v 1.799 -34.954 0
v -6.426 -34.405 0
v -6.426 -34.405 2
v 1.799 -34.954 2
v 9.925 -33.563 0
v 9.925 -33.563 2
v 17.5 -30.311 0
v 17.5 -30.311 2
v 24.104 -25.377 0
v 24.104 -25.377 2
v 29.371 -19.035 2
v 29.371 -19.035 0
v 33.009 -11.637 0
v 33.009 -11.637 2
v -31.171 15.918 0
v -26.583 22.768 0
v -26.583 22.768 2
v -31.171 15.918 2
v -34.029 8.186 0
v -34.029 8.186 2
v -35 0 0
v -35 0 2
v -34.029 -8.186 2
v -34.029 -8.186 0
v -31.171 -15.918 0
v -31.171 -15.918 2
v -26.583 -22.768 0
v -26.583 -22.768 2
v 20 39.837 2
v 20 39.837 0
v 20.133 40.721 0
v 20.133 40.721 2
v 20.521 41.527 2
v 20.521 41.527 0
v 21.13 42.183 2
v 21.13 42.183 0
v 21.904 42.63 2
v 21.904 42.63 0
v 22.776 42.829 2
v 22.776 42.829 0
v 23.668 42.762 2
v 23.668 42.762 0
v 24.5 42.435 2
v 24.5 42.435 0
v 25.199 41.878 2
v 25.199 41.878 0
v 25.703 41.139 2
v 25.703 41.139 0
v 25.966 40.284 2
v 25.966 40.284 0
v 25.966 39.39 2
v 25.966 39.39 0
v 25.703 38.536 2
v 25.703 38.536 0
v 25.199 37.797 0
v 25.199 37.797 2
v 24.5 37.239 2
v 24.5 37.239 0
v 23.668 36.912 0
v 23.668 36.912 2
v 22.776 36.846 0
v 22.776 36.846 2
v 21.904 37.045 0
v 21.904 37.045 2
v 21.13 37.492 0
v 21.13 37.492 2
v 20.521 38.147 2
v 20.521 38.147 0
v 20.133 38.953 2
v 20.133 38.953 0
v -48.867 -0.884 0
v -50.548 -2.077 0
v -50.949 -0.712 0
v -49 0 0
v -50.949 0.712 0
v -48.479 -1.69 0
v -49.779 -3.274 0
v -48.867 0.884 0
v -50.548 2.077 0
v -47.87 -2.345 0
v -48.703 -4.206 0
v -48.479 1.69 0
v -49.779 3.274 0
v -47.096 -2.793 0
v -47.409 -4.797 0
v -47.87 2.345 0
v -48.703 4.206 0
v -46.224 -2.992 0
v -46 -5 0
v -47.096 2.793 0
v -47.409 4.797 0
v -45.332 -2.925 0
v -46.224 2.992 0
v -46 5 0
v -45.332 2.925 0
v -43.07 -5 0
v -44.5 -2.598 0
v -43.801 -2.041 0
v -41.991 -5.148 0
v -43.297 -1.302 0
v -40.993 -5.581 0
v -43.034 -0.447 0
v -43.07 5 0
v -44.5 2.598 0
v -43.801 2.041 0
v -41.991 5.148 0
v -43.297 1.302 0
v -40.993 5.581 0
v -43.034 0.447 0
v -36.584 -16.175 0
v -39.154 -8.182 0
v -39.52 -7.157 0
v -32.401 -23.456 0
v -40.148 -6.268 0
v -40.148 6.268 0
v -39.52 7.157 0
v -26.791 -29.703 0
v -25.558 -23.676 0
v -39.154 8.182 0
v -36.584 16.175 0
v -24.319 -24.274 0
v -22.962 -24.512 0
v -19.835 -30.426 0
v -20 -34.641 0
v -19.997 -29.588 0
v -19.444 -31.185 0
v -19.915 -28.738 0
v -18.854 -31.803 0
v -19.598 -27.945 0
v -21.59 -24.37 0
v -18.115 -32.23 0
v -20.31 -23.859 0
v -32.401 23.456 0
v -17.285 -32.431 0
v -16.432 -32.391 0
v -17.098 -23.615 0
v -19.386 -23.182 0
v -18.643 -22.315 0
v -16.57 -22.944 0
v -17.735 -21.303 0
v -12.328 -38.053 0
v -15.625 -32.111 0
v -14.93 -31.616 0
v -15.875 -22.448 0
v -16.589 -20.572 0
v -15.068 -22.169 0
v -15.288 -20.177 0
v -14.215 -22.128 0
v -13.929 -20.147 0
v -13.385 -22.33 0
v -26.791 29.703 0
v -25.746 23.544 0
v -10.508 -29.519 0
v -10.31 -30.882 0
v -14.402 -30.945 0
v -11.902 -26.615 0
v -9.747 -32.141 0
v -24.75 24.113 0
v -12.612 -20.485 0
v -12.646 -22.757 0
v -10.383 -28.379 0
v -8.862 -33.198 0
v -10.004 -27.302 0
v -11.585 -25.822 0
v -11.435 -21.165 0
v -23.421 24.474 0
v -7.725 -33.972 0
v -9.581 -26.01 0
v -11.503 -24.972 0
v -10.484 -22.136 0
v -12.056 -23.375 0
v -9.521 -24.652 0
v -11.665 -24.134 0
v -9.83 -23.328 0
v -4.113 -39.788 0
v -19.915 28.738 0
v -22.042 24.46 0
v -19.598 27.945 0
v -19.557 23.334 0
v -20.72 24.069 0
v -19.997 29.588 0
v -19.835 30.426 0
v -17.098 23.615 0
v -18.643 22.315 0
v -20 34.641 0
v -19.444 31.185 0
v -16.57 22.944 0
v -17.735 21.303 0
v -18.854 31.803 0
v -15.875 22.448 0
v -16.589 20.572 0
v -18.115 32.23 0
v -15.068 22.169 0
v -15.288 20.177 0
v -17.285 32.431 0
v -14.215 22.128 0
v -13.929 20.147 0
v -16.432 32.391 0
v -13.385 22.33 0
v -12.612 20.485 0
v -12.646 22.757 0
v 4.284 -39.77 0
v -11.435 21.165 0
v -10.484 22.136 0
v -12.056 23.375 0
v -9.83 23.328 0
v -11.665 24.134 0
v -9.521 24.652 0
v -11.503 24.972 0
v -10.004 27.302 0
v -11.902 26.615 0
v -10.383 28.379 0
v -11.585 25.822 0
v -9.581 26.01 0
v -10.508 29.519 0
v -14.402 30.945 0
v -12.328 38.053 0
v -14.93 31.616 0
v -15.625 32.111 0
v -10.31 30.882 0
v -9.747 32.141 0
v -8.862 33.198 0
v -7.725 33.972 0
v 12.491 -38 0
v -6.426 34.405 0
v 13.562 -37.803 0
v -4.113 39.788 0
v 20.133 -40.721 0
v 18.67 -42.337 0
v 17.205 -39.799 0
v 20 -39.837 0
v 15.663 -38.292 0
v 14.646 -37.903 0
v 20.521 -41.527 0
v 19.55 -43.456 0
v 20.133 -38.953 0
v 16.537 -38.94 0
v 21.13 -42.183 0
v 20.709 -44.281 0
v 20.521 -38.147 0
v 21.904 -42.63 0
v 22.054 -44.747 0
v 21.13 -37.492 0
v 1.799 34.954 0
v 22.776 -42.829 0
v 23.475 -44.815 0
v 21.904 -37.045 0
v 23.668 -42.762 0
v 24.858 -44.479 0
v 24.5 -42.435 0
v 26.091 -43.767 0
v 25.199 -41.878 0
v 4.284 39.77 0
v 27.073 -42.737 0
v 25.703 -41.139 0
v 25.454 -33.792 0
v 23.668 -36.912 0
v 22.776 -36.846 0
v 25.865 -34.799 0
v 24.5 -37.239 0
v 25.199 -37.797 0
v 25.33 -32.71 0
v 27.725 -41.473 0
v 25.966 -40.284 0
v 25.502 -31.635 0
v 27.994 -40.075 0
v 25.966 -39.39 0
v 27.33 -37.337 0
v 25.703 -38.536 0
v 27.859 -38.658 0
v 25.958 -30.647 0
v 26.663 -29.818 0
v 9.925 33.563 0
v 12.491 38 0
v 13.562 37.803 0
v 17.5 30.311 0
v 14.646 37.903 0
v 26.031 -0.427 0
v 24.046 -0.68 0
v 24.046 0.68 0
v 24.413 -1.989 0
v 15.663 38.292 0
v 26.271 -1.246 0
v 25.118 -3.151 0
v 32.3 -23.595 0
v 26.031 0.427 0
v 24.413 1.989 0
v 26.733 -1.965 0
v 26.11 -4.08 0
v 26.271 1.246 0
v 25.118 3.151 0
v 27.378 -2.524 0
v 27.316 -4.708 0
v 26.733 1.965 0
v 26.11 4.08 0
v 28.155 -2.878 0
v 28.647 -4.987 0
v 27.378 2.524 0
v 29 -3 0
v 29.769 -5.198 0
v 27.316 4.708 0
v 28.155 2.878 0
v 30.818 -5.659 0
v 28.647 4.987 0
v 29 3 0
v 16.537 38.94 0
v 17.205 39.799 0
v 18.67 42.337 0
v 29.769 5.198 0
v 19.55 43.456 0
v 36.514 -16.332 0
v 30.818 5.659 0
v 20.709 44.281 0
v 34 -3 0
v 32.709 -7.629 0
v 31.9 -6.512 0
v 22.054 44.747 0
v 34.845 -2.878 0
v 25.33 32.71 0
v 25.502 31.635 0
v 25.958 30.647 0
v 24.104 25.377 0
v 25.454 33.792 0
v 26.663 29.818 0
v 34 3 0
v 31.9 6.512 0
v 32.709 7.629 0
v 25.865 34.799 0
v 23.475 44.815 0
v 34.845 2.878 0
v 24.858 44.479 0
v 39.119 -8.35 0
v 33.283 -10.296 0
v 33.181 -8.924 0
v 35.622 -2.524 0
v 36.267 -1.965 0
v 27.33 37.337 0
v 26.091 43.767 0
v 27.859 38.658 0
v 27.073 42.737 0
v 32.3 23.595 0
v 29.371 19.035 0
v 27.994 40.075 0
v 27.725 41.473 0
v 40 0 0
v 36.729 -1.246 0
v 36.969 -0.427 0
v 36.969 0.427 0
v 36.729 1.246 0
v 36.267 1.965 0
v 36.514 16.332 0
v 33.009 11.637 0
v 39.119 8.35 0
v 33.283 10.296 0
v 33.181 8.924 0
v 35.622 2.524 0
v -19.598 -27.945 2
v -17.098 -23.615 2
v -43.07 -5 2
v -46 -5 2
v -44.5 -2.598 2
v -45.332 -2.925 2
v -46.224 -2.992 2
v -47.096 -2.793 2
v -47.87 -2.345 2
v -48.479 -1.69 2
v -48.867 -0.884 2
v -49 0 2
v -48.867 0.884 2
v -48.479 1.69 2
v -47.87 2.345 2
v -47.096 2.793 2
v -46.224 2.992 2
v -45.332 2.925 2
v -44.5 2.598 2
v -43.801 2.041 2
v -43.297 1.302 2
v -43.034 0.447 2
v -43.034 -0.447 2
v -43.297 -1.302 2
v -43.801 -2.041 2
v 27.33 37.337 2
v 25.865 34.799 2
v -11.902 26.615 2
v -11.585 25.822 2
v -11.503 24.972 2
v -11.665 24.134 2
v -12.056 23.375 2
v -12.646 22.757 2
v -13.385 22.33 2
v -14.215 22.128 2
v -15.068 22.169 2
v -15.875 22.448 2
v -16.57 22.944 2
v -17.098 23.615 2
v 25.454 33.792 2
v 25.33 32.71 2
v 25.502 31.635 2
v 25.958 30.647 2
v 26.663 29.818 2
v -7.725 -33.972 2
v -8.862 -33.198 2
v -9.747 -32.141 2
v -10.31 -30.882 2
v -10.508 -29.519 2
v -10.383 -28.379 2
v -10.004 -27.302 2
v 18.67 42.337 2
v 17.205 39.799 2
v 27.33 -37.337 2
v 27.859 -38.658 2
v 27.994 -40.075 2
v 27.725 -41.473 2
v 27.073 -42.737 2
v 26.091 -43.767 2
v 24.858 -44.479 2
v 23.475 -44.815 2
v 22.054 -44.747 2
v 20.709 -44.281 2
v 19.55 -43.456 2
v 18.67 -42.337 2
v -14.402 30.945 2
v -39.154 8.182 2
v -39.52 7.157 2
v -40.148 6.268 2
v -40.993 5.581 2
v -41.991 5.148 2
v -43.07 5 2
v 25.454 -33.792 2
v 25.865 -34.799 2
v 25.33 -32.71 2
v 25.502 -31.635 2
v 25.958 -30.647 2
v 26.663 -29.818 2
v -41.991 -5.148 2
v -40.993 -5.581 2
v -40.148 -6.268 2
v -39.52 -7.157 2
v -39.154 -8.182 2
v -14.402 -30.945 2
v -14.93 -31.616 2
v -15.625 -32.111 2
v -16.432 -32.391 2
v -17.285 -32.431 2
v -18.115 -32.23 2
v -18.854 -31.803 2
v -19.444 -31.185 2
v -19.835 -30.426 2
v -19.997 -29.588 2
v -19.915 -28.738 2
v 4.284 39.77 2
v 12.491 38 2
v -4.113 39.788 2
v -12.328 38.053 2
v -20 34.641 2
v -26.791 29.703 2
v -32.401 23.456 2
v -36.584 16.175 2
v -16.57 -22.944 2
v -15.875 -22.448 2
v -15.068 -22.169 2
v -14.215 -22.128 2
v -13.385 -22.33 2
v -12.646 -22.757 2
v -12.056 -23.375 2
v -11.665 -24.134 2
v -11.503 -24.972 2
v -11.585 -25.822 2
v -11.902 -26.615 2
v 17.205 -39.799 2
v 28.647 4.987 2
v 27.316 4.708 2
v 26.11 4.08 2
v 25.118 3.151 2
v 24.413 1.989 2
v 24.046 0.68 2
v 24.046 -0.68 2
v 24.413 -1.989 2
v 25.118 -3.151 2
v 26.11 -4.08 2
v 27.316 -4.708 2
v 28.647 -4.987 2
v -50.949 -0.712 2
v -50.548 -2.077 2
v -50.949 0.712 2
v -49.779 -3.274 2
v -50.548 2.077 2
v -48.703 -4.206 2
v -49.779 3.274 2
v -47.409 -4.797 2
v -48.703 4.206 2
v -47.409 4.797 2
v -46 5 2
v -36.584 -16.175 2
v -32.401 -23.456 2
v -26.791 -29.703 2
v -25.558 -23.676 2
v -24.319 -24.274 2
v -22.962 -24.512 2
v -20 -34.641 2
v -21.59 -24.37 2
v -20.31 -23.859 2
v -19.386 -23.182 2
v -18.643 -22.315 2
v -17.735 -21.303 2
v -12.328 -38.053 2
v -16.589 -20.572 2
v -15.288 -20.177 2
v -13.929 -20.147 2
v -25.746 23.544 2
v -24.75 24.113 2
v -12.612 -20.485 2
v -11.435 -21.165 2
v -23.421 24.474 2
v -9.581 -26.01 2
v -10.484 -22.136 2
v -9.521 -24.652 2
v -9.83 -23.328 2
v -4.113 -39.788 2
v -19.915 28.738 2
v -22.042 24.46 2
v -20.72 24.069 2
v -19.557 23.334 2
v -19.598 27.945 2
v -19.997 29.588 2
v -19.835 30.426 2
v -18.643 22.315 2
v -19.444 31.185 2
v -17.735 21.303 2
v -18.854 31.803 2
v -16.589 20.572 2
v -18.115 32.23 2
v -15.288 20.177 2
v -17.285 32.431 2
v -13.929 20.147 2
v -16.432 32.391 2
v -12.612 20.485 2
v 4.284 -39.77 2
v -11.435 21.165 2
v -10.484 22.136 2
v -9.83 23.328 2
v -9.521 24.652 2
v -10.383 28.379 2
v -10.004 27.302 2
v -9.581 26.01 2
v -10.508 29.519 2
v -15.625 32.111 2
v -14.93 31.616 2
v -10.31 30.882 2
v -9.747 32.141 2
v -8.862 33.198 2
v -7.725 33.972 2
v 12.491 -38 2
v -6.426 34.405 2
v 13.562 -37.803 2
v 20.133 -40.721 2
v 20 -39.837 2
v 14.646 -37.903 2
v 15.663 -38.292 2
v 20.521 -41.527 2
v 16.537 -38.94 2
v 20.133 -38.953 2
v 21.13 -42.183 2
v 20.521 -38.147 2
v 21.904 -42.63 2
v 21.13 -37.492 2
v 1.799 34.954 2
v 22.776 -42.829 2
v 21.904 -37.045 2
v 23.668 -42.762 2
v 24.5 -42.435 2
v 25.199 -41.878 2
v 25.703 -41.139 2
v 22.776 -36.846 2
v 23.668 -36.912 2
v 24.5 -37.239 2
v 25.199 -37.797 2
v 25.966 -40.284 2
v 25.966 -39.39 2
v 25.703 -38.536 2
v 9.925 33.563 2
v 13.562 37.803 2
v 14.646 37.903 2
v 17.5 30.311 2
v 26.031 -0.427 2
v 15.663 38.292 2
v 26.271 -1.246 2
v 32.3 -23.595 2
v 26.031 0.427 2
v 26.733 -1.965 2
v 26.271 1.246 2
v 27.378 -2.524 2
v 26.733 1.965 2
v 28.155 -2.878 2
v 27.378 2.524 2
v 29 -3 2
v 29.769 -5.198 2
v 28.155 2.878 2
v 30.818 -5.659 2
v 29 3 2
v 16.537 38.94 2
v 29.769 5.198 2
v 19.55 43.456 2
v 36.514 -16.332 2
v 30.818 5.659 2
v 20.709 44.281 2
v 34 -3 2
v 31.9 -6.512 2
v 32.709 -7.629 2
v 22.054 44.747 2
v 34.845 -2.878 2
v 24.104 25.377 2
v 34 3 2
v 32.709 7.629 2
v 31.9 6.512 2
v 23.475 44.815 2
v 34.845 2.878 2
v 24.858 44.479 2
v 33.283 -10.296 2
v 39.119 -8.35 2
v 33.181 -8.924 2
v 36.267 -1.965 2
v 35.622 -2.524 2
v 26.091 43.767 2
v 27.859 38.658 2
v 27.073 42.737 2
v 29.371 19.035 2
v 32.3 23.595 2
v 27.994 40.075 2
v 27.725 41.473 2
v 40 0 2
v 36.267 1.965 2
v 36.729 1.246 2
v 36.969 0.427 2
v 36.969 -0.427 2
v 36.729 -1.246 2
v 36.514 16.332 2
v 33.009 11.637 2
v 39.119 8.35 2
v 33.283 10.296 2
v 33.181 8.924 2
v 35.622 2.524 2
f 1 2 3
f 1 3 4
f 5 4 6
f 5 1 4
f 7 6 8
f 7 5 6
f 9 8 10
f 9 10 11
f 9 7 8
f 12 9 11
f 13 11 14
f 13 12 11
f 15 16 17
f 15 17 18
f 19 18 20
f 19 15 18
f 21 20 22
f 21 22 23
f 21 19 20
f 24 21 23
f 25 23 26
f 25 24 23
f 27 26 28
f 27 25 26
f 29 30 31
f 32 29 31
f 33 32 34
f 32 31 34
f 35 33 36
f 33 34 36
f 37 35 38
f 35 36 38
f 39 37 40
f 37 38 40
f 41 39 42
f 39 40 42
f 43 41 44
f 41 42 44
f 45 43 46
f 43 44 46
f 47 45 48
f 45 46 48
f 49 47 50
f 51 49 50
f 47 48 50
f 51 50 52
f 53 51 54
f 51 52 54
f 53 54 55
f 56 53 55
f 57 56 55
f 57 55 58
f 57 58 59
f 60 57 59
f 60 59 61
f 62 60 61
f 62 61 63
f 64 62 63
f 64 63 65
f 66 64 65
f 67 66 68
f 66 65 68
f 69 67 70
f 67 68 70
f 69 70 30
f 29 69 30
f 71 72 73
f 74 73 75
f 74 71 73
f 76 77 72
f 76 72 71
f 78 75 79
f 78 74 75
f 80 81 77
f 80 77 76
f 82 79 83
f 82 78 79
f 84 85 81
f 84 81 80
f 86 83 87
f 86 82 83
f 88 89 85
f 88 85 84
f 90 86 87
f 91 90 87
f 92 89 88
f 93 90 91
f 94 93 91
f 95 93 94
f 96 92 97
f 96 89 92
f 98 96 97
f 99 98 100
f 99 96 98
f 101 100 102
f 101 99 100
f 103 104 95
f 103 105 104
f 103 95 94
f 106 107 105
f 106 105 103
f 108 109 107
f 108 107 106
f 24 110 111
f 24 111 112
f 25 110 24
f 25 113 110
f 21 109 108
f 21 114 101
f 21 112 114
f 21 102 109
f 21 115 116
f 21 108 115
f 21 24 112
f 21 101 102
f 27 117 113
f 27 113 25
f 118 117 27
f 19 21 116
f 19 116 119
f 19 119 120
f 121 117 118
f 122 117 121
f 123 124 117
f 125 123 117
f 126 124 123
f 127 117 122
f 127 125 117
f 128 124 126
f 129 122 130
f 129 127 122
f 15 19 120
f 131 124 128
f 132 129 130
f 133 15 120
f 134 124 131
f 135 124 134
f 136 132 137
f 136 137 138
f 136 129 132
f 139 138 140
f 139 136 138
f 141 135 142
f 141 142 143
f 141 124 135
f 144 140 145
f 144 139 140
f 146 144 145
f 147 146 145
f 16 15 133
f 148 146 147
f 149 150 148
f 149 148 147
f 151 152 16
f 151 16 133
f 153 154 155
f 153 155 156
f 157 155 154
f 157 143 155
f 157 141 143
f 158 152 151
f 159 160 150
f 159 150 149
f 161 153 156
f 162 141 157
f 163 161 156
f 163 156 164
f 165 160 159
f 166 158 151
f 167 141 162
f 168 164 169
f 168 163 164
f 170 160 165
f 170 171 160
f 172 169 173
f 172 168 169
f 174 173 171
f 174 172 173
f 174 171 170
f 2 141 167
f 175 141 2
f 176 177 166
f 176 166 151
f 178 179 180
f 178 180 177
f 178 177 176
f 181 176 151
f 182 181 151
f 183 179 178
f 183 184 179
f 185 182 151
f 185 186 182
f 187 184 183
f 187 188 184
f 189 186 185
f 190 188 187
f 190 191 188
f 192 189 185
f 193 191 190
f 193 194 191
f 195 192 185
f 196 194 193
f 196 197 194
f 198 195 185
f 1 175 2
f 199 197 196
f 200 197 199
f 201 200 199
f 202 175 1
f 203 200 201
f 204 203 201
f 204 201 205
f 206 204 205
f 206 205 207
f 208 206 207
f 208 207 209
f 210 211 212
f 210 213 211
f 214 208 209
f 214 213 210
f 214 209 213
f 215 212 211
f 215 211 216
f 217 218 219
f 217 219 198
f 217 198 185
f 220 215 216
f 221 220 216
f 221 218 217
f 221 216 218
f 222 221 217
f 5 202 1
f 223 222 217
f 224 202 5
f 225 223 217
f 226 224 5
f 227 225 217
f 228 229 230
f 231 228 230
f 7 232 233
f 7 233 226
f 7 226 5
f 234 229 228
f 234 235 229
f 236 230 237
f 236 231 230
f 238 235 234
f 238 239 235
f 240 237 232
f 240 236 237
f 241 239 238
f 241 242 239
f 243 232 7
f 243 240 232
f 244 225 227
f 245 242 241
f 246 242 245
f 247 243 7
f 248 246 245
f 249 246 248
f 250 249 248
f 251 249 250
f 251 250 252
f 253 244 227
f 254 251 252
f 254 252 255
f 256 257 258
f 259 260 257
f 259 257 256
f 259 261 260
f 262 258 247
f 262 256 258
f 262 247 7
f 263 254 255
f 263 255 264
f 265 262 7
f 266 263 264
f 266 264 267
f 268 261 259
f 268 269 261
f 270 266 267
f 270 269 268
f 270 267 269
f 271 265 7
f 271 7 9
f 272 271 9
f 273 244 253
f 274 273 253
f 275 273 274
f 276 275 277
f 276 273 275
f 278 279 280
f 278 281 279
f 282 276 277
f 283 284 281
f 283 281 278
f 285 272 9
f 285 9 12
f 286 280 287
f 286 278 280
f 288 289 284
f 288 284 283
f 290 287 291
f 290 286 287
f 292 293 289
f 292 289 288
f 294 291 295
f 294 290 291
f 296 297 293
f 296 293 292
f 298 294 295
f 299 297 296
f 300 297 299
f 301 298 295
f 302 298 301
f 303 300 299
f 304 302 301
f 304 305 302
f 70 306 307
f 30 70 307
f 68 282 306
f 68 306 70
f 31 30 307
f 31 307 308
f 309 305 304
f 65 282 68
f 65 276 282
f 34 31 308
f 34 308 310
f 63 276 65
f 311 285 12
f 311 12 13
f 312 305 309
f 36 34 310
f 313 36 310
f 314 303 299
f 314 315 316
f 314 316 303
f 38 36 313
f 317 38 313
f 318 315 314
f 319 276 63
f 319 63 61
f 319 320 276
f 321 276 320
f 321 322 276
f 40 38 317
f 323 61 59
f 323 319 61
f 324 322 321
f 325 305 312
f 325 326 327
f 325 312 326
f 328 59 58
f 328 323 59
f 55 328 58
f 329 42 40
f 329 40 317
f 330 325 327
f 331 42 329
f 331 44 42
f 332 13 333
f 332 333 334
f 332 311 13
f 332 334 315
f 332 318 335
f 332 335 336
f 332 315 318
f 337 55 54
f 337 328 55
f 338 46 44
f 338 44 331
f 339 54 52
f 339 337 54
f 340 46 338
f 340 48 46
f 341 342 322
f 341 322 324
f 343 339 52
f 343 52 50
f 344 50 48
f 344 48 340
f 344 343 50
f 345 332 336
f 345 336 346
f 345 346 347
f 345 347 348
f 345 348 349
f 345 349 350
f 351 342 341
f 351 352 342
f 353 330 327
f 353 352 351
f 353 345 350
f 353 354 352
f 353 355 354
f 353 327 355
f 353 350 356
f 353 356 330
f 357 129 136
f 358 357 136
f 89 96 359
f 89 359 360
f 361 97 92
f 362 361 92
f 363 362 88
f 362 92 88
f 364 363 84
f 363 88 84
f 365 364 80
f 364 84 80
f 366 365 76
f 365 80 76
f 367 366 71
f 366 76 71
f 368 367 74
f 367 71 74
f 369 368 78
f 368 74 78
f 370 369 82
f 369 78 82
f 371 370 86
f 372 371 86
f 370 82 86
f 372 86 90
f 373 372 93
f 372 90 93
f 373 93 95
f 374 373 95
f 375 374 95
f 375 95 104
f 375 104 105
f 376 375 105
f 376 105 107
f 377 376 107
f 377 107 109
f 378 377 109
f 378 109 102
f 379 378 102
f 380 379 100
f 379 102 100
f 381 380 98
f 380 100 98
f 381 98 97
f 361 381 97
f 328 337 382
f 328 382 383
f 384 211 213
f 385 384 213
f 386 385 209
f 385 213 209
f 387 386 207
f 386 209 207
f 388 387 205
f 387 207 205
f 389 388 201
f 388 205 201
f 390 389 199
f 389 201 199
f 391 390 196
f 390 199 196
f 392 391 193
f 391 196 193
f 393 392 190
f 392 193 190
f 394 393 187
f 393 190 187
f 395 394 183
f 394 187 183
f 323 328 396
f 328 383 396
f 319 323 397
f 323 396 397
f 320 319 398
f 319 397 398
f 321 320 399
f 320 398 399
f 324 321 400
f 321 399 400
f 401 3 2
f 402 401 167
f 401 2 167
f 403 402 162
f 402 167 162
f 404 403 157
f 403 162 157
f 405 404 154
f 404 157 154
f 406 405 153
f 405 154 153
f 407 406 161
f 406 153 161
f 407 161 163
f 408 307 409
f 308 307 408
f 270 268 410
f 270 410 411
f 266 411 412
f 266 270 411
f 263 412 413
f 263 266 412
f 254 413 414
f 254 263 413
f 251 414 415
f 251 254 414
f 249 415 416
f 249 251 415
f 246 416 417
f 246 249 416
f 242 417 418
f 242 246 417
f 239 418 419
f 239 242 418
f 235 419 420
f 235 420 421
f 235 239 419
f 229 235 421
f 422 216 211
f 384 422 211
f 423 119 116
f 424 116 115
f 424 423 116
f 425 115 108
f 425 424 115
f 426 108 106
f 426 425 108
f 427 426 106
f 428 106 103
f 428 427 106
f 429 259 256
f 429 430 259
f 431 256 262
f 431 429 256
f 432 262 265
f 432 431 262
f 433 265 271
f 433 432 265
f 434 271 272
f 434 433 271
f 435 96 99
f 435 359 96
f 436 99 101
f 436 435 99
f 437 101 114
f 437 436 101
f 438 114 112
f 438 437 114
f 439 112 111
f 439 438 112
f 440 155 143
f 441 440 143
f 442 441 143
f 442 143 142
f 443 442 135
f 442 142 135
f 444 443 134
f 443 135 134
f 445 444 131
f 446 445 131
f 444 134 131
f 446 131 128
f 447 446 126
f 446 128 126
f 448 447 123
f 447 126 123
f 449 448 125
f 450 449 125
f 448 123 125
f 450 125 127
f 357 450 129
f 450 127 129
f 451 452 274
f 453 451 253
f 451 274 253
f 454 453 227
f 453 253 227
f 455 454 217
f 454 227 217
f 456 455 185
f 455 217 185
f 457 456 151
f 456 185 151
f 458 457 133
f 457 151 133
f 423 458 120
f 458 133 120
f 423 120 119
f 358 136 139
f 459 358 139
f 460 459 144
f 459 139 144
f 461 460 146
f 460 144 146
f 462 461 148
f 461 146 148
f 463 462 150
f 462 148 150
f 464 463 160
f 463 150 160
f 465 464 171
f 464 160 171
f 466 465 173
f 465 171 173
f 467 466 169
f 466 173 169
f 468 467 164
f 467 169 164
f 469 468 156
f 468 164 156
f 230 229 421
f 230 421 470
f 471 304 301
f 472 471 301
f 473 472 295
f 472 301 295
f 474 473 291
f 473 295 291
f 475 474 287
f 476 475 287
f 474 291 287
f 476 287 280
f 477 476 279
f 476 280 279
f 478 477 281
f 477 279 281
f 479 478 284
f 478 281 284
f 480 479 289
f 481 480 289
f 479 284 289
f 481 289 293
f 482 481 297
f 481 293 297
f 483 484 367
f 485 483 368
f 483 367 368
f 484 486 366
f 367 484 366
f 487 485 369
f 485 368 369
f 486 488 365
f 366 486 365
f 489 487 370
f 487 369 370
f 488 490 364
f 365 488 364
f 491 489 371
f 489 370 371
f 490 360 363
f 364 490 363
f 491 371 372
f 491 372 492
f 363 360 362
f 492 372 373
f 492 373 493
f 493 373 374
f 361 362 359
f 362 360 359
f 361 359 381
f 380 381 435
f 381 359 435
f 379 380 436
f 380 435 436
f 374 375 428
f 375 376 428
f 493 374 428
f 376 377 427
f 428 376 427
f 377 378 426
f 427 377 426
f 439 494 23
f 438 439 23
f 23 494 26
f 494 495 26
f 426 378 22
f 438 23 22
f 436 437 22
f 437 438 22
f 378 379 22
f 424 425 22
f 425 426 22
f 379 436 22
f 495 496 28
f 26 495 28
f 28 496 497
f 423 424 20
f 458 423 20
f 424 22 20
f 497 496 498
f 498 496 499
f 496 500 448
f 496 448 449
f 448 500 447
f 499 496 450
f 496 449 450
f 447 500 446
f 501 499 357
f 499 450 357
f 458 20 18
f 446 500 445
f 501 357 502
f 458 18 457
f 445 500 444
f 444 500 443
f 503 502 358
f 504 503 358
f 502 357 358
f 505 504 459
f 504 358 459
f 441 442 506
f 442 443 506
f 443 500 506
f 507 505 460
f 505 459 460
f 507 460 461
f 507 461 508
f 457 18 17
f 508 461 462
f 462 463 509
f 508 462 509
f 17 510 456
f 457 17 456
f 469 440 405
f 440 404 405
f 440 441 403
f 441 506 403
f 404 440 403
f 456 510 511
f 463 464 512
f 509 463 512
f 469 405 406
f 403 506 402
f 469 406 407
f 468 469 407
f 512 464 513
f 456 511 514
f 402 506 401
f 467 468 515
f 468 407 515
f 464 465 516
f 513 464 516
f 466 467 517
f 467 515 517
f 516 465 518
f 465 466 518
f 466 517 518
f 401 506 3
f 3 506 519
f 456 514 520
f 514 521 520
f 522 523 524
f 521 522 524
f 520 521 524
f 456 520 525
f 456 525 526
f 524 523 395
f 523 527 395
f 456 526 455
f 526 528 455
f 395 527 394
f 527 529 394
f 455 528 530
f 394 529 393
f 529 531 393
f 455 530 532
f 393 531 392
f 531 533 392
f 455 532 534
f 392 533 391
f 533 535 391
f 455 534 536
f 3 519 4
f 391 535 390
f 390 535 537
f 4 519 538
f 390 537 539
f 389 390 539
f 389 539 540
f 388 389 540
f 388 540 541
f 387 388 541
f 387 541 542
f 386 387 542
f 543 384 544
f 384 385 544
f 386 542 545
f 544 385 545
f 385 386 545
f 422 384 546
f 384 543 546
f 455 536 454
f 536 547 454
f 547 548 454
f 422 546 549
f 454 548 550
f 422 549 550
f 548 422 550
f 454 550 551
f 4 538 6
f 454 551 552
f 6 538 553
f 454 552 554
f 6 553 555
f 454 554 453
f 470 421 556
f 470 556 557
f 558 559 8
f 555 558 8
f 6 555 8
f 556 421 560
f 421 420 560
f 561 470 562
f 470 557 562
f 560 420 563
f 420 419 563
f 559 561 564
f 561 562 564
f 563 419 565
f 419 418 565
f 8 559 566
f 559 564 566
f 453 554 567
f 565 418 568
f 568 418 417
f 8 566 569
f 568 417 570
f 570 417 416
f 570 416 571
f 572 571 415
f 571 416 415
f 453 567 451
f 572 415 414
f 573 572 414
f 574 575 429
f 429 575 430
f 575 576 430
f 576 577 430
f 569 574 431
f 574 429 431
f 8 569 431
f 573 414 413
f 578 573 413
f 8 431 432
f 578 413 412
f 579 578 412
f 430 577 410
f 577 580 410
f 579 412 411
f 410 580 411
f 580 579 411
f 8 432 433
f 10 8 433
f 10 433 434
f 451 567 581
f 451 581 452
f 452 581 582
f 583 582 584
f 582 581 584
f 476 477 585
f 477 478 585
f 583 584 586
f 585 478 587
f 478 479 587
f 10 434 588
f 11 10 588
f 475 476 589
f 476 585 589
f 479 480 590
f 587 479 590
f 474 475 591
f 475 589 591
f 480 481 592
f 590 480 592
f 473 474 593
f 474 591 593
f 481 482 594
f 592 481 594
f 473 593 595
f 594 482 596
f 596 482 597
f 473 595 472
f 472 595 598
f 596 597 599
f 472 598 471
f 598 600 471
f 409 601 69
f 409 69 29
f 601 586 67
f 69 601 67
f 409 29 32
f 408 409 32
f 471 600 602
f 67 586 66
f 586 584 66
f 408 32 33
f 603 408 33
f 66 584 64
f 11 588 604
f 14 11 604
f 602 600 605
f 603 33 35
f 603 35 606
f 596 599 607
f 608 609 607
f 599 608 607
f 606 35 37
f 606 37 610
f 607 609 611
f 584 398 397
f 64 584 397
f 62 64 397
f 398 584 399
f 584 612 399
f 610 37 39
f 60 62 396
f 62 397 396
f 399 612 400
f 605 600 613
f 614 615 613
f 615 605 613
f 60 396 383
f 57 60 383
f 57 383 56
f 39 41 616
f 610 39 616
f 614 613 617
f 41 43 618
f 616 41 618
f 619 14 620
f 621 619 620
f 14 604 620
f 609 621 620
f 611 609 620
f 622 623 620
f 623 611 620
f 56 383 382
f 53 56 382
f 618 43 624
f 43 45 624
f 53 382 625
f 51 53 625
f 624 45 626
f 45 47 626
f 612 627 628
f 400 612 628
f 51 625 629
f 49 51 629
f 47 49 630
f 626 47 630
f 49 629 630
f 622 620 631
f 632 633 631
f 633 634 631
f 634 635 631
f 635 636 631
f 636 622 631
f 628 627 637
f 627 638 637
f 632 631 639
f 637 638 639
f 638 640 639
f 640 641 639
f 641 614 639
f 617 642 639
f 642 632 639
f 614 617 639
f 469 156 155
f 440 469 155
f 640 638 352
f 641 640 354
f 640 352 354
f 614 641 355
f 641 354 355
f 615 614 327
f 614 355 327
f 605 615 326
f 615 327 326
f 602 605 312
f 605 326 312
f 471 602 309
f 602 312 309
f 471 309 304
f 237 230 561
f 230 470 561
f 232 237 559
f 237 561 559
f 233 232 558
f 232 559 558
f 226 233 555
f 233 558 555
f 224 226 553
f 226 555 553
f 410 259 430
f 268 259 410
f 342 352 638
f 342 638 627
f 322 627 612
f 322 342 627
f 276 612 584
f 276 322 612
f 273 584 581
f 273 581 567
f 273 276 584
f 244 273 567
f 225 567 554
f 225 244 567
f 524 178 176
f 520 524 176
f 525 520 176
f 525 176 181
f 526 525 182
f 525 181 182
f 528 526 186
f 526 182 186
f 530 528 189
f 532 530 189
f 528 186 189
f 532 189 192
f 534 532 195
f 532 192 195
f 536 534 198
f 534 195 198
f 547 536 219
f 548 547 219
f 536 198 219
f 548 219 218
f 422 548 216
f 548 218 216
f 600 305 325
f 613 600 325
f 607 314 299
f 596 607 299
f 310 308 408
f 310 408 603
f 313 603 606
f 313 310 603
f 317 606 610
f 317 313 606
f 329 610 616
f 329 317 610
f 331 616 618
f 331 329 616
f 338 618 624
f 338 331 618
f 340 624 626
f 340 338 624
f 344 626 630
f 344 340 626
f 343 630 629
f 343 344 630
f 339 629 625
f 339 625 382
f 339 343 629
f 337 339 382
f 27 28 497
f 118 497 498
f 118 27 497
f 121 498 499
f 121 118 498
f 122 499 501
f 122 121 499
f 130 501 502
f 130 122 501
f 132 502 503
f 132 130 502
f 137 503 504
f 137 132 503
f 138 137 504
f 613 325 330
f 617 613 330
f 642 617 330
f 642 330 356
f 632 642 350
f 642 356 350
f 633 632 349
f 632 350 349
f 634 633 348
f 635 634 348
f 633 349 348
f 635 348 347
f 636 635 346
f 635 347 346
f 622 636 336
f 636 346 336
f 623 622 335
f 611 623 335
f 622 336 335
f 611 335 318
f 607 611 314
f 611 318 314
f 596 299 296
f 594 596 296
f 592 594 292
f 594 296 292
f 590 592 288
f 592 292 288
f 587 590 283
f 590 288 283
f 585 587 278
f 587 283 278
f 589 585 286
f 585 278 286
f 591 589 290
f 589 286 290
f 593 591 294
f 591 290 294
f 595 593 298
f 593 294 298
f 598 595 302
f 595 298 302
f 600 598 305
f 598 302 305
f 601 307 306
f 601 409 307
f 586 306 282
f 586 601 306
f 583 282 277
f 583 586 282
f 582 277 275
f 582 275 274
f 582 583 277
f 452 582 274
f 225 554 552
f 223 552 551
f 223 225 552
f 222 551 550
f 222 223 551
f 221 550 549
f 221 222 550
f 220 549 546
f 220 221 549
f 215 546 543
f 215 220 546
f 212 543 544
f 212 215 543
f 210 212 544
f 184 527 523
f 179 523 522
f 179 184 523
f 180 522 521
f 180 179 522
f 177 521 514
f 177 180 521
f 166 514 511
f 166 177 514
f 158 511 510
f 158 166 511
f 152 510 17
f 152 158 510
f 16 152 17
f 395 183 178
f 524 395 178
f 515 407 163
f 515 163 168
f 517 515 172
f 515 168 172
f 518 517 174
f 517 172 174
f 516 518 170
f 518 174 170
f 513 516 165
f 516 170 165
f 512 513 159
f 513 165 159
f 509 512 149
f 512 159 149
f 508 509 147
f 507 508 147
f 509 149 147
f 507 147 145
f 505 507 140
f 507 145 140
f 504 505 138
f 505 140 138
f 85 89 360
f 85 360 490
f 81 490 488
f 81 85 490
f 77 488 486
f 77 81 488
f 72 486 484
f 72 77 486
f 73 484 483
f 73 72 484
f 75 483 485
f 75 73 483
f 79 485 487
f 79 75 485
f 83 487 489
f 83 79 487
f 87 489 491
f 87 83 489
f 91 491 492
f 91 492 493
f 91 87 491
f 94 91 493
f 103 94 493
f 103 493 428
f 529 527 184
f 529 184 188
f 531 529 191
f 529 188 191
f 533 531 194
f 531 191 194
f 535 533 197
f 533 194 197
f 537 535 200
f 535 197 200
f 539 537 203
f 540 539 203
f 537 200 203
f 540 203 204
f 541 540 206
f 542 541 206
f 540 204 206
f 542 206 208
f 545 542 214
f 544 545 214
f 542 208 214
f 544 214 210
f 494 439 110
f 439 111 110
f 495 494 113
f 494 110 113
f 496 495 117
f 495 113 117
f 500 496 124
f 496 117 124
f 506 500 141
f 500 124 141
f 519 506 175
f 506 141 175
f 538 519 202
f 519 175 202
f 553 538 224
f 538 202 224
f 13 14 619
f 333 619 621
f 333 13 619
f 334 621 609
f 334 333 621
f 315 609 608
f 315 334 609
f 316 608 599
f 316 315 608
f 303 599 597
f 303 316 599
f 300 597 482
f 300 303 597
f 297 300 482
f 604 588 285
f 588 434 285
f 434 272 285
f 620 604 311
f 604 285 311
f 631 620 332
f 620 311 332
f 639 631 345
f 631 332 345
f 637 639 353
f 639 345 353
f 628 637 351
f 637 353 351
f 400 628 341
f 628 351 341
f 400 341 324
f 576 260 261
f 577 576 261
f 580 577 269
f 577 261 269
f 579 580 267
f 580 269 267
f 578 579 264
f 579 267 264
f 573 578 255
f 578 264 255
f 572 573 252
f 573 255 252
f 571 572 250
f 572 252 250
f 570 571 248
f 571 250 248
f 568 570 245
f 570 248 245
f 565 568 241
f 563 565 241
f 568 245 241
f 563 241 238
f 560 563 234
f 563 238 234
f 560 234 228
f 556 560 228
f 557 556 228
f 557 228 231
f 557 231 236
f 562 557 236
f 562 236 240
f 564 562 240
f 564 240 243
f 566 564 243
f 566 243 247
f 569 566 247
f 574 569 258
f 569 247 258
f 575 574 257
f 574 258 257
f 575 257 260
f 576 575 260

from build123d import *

# Parameters (mm, degrees)
SKETCH1_R                = 40
SKETCH1_R_2              = 35
BOSS_EXTRUDE1_DEPTH      = 2
BOSS_EXTRUDE2_DEPTH      = 2
SKETCH3_R                = 3
CUT_EXTRUDE1_DEPTH       = 2
FILLET1_R                = 5
CIRPATTERN1_COUNT        = 3
FILLET1_OF_CIRPATTERN1_R = 5
SKETCH4_R                = 3
BOSS_EXTRUDE3_DEPTH      = 2
FILLET2_R                = 4
CIRPATTERN2_COUNT        = 3
FILLET2_OF_CIRPATTERN2_R = 4


with BuildPart() as part:
    # Sketch1 → Boss-Extrude1 (new body)
    with BuildSketch(Plane.XY):
        Circle(SKETCH1_R)
        Circle(SKETCH1_R_2, mode=Mode.SUBTRACT)
    extrude(amount=BOSS_EXTRUDE1_DEPTH)

    # Sketch2 → Boss-Extrude2 (add)
    with BuildSketch(Plane(origin=(0, 0, 0), x_dir=(-1, 0, 0), z_dir=(0, 0, -1))):
        with BuildLine():
            Line((-29, -5), (-34.641016151, -5))
            Line((-34.641016151, -5), (-37, -5))
            Line((-37, -5), (-37, 5))
            Line((-37, 5), (-34.641016151, 5))
            Line((-34.641016151, 5), (-29, 5))
            ThreePointArc((-29, 5), (-24, 0), (-29, -5))
        make_face()
        with BuildLine():
            Line((-34, -3), (-29, -3))
            ThreePointArc((-29, -3), (-26, 0), (-29, 3))
            Line((-29, 3), (-34, 3))
            ThreePointArc((-34, 3), (-37, 0), (-34, -3))
        make_face(mode=Mode.SUBTRACT)
    boss_extrude2 = extrude(amount=-BOSS_EXTRUDE2_DEPTH)

    # Sketch3 → Cut-Extrude1 (cut)
    with BuildSketch(Plane(origin=(0, 0, 0), x_dir=(-1, 0, 0), z_dir=(0, 0, -1))):
        with Locations((-34, 0)):
            Circle(SKETCH3_R)
    cut_extrude1 = extrude(amount=-CUT_EXTRUDE1_DEPTH, mode=Mode.SUBTRACT)

    # Fillet1
    fillet1_edges = [part.edges().sort_by_distance(p)[0] for p in [
        (34.641016151, -5, 1),
        (34.641016151, 5, 1),
    ]]
    fillet(fillet1_edges, radius=FILLET1_R)

    # CirPattern1: Boss-Extrude2, Cut-Extrude1 ×3 about axis
    cirpattern1_axis = Axis((0, 0, 0), (0, 0, 1))
    for i in range(1, CIRPATTERN1_COUNT):
        add(boss_extrude2.rotate(cirpattern1_axis, i * 360 / CIRPATTERN1_COUNT))
        add(cut_extrude1.rotate(cirpattern1_axis, i * 360 / CIRPATTERN1_COUNT), mode=Mode.SUBTRACT)

    # Fillet1 of CirPattern1
    fillet1_of_cirpattern1_edges = [part.edges().sort_by_distance(p)[0] for p in [
        (-12.990381057, 32.5, 1),
        (-21.650635095, 27.5, 1),
        (-21.650635095, -27.5, 1),
        (-12.990381057, -32.5, 1),
    ]]
    fillet(fillet1_of_cirpattern1_edges, radius=FILLET1_OF_CIRPATTERN1_R)

    # Sketch4 → Boss-Extrude3 (add)
    with BuildSketch(Plane(origin=(0, 0, 0), x_dir=(-1, 0, 0), z_dir=(0, 0, -1))):
        with BuildLine():
            Line((-15.513007814, 36.869317712), (-18.669872981, 42.337168574))
            ThreePointArc((-18.669872981, 42.337168574), (-25.5, 44.167295593), (-27.330127019, 37.337168574))
            Line((-27.330127019, 37.337168574), (-24.173261852, 31.869317712))
            Line((-24.173261852, 31.869317712), (-15.513007814, 36.869317712))
        make_face()
        with Locations((-23, 39.837168574)):
            Circle(SKETCH4_R, mode=Mode.SUBTRACT)
    boss_extrude3 = extrude(amount=-BOSS_EXTRUDE3_DEPTH)

    # Fillet2
    fillet2_edges = [part.edges().sort_by_distance(p)[0] for p in [
        (15.513007814, 36.869317712, 1),
        (24.173261852, 31.869317712, 1),
    ]]
    fillet(fillet2_edges, radius=FILLET2_R)

    # CirPattern2: Boss-Extrude3 ×3 about axis
    cirpattern2_axis = Axis((0, 0, 0), (0, 0, 1))
    for i in range(1, CIRPATTERN2_COUNT):
        add(boss_extrude3.rotate(cirpattern2_axis, i * 360 / CIRPATTERN2_COUNT))

    # Fillet2 of CirPattern2
    fillet2_of_cirpattern2_edges = [part.edges().sort_by_distance(p)[0] for p in [
        (-39.686269666, -5, 1),
        (-39.686269666, 5, 1),
        (24.173261852, -31.869317712, 1),
        (15.513007814, -36.869317712, 1),
    ]]
    fillet(fillet2_of_cirpattern2_edges, radius=FILLET2_OF_CIRPATTERN2_R)


solid = part.part
